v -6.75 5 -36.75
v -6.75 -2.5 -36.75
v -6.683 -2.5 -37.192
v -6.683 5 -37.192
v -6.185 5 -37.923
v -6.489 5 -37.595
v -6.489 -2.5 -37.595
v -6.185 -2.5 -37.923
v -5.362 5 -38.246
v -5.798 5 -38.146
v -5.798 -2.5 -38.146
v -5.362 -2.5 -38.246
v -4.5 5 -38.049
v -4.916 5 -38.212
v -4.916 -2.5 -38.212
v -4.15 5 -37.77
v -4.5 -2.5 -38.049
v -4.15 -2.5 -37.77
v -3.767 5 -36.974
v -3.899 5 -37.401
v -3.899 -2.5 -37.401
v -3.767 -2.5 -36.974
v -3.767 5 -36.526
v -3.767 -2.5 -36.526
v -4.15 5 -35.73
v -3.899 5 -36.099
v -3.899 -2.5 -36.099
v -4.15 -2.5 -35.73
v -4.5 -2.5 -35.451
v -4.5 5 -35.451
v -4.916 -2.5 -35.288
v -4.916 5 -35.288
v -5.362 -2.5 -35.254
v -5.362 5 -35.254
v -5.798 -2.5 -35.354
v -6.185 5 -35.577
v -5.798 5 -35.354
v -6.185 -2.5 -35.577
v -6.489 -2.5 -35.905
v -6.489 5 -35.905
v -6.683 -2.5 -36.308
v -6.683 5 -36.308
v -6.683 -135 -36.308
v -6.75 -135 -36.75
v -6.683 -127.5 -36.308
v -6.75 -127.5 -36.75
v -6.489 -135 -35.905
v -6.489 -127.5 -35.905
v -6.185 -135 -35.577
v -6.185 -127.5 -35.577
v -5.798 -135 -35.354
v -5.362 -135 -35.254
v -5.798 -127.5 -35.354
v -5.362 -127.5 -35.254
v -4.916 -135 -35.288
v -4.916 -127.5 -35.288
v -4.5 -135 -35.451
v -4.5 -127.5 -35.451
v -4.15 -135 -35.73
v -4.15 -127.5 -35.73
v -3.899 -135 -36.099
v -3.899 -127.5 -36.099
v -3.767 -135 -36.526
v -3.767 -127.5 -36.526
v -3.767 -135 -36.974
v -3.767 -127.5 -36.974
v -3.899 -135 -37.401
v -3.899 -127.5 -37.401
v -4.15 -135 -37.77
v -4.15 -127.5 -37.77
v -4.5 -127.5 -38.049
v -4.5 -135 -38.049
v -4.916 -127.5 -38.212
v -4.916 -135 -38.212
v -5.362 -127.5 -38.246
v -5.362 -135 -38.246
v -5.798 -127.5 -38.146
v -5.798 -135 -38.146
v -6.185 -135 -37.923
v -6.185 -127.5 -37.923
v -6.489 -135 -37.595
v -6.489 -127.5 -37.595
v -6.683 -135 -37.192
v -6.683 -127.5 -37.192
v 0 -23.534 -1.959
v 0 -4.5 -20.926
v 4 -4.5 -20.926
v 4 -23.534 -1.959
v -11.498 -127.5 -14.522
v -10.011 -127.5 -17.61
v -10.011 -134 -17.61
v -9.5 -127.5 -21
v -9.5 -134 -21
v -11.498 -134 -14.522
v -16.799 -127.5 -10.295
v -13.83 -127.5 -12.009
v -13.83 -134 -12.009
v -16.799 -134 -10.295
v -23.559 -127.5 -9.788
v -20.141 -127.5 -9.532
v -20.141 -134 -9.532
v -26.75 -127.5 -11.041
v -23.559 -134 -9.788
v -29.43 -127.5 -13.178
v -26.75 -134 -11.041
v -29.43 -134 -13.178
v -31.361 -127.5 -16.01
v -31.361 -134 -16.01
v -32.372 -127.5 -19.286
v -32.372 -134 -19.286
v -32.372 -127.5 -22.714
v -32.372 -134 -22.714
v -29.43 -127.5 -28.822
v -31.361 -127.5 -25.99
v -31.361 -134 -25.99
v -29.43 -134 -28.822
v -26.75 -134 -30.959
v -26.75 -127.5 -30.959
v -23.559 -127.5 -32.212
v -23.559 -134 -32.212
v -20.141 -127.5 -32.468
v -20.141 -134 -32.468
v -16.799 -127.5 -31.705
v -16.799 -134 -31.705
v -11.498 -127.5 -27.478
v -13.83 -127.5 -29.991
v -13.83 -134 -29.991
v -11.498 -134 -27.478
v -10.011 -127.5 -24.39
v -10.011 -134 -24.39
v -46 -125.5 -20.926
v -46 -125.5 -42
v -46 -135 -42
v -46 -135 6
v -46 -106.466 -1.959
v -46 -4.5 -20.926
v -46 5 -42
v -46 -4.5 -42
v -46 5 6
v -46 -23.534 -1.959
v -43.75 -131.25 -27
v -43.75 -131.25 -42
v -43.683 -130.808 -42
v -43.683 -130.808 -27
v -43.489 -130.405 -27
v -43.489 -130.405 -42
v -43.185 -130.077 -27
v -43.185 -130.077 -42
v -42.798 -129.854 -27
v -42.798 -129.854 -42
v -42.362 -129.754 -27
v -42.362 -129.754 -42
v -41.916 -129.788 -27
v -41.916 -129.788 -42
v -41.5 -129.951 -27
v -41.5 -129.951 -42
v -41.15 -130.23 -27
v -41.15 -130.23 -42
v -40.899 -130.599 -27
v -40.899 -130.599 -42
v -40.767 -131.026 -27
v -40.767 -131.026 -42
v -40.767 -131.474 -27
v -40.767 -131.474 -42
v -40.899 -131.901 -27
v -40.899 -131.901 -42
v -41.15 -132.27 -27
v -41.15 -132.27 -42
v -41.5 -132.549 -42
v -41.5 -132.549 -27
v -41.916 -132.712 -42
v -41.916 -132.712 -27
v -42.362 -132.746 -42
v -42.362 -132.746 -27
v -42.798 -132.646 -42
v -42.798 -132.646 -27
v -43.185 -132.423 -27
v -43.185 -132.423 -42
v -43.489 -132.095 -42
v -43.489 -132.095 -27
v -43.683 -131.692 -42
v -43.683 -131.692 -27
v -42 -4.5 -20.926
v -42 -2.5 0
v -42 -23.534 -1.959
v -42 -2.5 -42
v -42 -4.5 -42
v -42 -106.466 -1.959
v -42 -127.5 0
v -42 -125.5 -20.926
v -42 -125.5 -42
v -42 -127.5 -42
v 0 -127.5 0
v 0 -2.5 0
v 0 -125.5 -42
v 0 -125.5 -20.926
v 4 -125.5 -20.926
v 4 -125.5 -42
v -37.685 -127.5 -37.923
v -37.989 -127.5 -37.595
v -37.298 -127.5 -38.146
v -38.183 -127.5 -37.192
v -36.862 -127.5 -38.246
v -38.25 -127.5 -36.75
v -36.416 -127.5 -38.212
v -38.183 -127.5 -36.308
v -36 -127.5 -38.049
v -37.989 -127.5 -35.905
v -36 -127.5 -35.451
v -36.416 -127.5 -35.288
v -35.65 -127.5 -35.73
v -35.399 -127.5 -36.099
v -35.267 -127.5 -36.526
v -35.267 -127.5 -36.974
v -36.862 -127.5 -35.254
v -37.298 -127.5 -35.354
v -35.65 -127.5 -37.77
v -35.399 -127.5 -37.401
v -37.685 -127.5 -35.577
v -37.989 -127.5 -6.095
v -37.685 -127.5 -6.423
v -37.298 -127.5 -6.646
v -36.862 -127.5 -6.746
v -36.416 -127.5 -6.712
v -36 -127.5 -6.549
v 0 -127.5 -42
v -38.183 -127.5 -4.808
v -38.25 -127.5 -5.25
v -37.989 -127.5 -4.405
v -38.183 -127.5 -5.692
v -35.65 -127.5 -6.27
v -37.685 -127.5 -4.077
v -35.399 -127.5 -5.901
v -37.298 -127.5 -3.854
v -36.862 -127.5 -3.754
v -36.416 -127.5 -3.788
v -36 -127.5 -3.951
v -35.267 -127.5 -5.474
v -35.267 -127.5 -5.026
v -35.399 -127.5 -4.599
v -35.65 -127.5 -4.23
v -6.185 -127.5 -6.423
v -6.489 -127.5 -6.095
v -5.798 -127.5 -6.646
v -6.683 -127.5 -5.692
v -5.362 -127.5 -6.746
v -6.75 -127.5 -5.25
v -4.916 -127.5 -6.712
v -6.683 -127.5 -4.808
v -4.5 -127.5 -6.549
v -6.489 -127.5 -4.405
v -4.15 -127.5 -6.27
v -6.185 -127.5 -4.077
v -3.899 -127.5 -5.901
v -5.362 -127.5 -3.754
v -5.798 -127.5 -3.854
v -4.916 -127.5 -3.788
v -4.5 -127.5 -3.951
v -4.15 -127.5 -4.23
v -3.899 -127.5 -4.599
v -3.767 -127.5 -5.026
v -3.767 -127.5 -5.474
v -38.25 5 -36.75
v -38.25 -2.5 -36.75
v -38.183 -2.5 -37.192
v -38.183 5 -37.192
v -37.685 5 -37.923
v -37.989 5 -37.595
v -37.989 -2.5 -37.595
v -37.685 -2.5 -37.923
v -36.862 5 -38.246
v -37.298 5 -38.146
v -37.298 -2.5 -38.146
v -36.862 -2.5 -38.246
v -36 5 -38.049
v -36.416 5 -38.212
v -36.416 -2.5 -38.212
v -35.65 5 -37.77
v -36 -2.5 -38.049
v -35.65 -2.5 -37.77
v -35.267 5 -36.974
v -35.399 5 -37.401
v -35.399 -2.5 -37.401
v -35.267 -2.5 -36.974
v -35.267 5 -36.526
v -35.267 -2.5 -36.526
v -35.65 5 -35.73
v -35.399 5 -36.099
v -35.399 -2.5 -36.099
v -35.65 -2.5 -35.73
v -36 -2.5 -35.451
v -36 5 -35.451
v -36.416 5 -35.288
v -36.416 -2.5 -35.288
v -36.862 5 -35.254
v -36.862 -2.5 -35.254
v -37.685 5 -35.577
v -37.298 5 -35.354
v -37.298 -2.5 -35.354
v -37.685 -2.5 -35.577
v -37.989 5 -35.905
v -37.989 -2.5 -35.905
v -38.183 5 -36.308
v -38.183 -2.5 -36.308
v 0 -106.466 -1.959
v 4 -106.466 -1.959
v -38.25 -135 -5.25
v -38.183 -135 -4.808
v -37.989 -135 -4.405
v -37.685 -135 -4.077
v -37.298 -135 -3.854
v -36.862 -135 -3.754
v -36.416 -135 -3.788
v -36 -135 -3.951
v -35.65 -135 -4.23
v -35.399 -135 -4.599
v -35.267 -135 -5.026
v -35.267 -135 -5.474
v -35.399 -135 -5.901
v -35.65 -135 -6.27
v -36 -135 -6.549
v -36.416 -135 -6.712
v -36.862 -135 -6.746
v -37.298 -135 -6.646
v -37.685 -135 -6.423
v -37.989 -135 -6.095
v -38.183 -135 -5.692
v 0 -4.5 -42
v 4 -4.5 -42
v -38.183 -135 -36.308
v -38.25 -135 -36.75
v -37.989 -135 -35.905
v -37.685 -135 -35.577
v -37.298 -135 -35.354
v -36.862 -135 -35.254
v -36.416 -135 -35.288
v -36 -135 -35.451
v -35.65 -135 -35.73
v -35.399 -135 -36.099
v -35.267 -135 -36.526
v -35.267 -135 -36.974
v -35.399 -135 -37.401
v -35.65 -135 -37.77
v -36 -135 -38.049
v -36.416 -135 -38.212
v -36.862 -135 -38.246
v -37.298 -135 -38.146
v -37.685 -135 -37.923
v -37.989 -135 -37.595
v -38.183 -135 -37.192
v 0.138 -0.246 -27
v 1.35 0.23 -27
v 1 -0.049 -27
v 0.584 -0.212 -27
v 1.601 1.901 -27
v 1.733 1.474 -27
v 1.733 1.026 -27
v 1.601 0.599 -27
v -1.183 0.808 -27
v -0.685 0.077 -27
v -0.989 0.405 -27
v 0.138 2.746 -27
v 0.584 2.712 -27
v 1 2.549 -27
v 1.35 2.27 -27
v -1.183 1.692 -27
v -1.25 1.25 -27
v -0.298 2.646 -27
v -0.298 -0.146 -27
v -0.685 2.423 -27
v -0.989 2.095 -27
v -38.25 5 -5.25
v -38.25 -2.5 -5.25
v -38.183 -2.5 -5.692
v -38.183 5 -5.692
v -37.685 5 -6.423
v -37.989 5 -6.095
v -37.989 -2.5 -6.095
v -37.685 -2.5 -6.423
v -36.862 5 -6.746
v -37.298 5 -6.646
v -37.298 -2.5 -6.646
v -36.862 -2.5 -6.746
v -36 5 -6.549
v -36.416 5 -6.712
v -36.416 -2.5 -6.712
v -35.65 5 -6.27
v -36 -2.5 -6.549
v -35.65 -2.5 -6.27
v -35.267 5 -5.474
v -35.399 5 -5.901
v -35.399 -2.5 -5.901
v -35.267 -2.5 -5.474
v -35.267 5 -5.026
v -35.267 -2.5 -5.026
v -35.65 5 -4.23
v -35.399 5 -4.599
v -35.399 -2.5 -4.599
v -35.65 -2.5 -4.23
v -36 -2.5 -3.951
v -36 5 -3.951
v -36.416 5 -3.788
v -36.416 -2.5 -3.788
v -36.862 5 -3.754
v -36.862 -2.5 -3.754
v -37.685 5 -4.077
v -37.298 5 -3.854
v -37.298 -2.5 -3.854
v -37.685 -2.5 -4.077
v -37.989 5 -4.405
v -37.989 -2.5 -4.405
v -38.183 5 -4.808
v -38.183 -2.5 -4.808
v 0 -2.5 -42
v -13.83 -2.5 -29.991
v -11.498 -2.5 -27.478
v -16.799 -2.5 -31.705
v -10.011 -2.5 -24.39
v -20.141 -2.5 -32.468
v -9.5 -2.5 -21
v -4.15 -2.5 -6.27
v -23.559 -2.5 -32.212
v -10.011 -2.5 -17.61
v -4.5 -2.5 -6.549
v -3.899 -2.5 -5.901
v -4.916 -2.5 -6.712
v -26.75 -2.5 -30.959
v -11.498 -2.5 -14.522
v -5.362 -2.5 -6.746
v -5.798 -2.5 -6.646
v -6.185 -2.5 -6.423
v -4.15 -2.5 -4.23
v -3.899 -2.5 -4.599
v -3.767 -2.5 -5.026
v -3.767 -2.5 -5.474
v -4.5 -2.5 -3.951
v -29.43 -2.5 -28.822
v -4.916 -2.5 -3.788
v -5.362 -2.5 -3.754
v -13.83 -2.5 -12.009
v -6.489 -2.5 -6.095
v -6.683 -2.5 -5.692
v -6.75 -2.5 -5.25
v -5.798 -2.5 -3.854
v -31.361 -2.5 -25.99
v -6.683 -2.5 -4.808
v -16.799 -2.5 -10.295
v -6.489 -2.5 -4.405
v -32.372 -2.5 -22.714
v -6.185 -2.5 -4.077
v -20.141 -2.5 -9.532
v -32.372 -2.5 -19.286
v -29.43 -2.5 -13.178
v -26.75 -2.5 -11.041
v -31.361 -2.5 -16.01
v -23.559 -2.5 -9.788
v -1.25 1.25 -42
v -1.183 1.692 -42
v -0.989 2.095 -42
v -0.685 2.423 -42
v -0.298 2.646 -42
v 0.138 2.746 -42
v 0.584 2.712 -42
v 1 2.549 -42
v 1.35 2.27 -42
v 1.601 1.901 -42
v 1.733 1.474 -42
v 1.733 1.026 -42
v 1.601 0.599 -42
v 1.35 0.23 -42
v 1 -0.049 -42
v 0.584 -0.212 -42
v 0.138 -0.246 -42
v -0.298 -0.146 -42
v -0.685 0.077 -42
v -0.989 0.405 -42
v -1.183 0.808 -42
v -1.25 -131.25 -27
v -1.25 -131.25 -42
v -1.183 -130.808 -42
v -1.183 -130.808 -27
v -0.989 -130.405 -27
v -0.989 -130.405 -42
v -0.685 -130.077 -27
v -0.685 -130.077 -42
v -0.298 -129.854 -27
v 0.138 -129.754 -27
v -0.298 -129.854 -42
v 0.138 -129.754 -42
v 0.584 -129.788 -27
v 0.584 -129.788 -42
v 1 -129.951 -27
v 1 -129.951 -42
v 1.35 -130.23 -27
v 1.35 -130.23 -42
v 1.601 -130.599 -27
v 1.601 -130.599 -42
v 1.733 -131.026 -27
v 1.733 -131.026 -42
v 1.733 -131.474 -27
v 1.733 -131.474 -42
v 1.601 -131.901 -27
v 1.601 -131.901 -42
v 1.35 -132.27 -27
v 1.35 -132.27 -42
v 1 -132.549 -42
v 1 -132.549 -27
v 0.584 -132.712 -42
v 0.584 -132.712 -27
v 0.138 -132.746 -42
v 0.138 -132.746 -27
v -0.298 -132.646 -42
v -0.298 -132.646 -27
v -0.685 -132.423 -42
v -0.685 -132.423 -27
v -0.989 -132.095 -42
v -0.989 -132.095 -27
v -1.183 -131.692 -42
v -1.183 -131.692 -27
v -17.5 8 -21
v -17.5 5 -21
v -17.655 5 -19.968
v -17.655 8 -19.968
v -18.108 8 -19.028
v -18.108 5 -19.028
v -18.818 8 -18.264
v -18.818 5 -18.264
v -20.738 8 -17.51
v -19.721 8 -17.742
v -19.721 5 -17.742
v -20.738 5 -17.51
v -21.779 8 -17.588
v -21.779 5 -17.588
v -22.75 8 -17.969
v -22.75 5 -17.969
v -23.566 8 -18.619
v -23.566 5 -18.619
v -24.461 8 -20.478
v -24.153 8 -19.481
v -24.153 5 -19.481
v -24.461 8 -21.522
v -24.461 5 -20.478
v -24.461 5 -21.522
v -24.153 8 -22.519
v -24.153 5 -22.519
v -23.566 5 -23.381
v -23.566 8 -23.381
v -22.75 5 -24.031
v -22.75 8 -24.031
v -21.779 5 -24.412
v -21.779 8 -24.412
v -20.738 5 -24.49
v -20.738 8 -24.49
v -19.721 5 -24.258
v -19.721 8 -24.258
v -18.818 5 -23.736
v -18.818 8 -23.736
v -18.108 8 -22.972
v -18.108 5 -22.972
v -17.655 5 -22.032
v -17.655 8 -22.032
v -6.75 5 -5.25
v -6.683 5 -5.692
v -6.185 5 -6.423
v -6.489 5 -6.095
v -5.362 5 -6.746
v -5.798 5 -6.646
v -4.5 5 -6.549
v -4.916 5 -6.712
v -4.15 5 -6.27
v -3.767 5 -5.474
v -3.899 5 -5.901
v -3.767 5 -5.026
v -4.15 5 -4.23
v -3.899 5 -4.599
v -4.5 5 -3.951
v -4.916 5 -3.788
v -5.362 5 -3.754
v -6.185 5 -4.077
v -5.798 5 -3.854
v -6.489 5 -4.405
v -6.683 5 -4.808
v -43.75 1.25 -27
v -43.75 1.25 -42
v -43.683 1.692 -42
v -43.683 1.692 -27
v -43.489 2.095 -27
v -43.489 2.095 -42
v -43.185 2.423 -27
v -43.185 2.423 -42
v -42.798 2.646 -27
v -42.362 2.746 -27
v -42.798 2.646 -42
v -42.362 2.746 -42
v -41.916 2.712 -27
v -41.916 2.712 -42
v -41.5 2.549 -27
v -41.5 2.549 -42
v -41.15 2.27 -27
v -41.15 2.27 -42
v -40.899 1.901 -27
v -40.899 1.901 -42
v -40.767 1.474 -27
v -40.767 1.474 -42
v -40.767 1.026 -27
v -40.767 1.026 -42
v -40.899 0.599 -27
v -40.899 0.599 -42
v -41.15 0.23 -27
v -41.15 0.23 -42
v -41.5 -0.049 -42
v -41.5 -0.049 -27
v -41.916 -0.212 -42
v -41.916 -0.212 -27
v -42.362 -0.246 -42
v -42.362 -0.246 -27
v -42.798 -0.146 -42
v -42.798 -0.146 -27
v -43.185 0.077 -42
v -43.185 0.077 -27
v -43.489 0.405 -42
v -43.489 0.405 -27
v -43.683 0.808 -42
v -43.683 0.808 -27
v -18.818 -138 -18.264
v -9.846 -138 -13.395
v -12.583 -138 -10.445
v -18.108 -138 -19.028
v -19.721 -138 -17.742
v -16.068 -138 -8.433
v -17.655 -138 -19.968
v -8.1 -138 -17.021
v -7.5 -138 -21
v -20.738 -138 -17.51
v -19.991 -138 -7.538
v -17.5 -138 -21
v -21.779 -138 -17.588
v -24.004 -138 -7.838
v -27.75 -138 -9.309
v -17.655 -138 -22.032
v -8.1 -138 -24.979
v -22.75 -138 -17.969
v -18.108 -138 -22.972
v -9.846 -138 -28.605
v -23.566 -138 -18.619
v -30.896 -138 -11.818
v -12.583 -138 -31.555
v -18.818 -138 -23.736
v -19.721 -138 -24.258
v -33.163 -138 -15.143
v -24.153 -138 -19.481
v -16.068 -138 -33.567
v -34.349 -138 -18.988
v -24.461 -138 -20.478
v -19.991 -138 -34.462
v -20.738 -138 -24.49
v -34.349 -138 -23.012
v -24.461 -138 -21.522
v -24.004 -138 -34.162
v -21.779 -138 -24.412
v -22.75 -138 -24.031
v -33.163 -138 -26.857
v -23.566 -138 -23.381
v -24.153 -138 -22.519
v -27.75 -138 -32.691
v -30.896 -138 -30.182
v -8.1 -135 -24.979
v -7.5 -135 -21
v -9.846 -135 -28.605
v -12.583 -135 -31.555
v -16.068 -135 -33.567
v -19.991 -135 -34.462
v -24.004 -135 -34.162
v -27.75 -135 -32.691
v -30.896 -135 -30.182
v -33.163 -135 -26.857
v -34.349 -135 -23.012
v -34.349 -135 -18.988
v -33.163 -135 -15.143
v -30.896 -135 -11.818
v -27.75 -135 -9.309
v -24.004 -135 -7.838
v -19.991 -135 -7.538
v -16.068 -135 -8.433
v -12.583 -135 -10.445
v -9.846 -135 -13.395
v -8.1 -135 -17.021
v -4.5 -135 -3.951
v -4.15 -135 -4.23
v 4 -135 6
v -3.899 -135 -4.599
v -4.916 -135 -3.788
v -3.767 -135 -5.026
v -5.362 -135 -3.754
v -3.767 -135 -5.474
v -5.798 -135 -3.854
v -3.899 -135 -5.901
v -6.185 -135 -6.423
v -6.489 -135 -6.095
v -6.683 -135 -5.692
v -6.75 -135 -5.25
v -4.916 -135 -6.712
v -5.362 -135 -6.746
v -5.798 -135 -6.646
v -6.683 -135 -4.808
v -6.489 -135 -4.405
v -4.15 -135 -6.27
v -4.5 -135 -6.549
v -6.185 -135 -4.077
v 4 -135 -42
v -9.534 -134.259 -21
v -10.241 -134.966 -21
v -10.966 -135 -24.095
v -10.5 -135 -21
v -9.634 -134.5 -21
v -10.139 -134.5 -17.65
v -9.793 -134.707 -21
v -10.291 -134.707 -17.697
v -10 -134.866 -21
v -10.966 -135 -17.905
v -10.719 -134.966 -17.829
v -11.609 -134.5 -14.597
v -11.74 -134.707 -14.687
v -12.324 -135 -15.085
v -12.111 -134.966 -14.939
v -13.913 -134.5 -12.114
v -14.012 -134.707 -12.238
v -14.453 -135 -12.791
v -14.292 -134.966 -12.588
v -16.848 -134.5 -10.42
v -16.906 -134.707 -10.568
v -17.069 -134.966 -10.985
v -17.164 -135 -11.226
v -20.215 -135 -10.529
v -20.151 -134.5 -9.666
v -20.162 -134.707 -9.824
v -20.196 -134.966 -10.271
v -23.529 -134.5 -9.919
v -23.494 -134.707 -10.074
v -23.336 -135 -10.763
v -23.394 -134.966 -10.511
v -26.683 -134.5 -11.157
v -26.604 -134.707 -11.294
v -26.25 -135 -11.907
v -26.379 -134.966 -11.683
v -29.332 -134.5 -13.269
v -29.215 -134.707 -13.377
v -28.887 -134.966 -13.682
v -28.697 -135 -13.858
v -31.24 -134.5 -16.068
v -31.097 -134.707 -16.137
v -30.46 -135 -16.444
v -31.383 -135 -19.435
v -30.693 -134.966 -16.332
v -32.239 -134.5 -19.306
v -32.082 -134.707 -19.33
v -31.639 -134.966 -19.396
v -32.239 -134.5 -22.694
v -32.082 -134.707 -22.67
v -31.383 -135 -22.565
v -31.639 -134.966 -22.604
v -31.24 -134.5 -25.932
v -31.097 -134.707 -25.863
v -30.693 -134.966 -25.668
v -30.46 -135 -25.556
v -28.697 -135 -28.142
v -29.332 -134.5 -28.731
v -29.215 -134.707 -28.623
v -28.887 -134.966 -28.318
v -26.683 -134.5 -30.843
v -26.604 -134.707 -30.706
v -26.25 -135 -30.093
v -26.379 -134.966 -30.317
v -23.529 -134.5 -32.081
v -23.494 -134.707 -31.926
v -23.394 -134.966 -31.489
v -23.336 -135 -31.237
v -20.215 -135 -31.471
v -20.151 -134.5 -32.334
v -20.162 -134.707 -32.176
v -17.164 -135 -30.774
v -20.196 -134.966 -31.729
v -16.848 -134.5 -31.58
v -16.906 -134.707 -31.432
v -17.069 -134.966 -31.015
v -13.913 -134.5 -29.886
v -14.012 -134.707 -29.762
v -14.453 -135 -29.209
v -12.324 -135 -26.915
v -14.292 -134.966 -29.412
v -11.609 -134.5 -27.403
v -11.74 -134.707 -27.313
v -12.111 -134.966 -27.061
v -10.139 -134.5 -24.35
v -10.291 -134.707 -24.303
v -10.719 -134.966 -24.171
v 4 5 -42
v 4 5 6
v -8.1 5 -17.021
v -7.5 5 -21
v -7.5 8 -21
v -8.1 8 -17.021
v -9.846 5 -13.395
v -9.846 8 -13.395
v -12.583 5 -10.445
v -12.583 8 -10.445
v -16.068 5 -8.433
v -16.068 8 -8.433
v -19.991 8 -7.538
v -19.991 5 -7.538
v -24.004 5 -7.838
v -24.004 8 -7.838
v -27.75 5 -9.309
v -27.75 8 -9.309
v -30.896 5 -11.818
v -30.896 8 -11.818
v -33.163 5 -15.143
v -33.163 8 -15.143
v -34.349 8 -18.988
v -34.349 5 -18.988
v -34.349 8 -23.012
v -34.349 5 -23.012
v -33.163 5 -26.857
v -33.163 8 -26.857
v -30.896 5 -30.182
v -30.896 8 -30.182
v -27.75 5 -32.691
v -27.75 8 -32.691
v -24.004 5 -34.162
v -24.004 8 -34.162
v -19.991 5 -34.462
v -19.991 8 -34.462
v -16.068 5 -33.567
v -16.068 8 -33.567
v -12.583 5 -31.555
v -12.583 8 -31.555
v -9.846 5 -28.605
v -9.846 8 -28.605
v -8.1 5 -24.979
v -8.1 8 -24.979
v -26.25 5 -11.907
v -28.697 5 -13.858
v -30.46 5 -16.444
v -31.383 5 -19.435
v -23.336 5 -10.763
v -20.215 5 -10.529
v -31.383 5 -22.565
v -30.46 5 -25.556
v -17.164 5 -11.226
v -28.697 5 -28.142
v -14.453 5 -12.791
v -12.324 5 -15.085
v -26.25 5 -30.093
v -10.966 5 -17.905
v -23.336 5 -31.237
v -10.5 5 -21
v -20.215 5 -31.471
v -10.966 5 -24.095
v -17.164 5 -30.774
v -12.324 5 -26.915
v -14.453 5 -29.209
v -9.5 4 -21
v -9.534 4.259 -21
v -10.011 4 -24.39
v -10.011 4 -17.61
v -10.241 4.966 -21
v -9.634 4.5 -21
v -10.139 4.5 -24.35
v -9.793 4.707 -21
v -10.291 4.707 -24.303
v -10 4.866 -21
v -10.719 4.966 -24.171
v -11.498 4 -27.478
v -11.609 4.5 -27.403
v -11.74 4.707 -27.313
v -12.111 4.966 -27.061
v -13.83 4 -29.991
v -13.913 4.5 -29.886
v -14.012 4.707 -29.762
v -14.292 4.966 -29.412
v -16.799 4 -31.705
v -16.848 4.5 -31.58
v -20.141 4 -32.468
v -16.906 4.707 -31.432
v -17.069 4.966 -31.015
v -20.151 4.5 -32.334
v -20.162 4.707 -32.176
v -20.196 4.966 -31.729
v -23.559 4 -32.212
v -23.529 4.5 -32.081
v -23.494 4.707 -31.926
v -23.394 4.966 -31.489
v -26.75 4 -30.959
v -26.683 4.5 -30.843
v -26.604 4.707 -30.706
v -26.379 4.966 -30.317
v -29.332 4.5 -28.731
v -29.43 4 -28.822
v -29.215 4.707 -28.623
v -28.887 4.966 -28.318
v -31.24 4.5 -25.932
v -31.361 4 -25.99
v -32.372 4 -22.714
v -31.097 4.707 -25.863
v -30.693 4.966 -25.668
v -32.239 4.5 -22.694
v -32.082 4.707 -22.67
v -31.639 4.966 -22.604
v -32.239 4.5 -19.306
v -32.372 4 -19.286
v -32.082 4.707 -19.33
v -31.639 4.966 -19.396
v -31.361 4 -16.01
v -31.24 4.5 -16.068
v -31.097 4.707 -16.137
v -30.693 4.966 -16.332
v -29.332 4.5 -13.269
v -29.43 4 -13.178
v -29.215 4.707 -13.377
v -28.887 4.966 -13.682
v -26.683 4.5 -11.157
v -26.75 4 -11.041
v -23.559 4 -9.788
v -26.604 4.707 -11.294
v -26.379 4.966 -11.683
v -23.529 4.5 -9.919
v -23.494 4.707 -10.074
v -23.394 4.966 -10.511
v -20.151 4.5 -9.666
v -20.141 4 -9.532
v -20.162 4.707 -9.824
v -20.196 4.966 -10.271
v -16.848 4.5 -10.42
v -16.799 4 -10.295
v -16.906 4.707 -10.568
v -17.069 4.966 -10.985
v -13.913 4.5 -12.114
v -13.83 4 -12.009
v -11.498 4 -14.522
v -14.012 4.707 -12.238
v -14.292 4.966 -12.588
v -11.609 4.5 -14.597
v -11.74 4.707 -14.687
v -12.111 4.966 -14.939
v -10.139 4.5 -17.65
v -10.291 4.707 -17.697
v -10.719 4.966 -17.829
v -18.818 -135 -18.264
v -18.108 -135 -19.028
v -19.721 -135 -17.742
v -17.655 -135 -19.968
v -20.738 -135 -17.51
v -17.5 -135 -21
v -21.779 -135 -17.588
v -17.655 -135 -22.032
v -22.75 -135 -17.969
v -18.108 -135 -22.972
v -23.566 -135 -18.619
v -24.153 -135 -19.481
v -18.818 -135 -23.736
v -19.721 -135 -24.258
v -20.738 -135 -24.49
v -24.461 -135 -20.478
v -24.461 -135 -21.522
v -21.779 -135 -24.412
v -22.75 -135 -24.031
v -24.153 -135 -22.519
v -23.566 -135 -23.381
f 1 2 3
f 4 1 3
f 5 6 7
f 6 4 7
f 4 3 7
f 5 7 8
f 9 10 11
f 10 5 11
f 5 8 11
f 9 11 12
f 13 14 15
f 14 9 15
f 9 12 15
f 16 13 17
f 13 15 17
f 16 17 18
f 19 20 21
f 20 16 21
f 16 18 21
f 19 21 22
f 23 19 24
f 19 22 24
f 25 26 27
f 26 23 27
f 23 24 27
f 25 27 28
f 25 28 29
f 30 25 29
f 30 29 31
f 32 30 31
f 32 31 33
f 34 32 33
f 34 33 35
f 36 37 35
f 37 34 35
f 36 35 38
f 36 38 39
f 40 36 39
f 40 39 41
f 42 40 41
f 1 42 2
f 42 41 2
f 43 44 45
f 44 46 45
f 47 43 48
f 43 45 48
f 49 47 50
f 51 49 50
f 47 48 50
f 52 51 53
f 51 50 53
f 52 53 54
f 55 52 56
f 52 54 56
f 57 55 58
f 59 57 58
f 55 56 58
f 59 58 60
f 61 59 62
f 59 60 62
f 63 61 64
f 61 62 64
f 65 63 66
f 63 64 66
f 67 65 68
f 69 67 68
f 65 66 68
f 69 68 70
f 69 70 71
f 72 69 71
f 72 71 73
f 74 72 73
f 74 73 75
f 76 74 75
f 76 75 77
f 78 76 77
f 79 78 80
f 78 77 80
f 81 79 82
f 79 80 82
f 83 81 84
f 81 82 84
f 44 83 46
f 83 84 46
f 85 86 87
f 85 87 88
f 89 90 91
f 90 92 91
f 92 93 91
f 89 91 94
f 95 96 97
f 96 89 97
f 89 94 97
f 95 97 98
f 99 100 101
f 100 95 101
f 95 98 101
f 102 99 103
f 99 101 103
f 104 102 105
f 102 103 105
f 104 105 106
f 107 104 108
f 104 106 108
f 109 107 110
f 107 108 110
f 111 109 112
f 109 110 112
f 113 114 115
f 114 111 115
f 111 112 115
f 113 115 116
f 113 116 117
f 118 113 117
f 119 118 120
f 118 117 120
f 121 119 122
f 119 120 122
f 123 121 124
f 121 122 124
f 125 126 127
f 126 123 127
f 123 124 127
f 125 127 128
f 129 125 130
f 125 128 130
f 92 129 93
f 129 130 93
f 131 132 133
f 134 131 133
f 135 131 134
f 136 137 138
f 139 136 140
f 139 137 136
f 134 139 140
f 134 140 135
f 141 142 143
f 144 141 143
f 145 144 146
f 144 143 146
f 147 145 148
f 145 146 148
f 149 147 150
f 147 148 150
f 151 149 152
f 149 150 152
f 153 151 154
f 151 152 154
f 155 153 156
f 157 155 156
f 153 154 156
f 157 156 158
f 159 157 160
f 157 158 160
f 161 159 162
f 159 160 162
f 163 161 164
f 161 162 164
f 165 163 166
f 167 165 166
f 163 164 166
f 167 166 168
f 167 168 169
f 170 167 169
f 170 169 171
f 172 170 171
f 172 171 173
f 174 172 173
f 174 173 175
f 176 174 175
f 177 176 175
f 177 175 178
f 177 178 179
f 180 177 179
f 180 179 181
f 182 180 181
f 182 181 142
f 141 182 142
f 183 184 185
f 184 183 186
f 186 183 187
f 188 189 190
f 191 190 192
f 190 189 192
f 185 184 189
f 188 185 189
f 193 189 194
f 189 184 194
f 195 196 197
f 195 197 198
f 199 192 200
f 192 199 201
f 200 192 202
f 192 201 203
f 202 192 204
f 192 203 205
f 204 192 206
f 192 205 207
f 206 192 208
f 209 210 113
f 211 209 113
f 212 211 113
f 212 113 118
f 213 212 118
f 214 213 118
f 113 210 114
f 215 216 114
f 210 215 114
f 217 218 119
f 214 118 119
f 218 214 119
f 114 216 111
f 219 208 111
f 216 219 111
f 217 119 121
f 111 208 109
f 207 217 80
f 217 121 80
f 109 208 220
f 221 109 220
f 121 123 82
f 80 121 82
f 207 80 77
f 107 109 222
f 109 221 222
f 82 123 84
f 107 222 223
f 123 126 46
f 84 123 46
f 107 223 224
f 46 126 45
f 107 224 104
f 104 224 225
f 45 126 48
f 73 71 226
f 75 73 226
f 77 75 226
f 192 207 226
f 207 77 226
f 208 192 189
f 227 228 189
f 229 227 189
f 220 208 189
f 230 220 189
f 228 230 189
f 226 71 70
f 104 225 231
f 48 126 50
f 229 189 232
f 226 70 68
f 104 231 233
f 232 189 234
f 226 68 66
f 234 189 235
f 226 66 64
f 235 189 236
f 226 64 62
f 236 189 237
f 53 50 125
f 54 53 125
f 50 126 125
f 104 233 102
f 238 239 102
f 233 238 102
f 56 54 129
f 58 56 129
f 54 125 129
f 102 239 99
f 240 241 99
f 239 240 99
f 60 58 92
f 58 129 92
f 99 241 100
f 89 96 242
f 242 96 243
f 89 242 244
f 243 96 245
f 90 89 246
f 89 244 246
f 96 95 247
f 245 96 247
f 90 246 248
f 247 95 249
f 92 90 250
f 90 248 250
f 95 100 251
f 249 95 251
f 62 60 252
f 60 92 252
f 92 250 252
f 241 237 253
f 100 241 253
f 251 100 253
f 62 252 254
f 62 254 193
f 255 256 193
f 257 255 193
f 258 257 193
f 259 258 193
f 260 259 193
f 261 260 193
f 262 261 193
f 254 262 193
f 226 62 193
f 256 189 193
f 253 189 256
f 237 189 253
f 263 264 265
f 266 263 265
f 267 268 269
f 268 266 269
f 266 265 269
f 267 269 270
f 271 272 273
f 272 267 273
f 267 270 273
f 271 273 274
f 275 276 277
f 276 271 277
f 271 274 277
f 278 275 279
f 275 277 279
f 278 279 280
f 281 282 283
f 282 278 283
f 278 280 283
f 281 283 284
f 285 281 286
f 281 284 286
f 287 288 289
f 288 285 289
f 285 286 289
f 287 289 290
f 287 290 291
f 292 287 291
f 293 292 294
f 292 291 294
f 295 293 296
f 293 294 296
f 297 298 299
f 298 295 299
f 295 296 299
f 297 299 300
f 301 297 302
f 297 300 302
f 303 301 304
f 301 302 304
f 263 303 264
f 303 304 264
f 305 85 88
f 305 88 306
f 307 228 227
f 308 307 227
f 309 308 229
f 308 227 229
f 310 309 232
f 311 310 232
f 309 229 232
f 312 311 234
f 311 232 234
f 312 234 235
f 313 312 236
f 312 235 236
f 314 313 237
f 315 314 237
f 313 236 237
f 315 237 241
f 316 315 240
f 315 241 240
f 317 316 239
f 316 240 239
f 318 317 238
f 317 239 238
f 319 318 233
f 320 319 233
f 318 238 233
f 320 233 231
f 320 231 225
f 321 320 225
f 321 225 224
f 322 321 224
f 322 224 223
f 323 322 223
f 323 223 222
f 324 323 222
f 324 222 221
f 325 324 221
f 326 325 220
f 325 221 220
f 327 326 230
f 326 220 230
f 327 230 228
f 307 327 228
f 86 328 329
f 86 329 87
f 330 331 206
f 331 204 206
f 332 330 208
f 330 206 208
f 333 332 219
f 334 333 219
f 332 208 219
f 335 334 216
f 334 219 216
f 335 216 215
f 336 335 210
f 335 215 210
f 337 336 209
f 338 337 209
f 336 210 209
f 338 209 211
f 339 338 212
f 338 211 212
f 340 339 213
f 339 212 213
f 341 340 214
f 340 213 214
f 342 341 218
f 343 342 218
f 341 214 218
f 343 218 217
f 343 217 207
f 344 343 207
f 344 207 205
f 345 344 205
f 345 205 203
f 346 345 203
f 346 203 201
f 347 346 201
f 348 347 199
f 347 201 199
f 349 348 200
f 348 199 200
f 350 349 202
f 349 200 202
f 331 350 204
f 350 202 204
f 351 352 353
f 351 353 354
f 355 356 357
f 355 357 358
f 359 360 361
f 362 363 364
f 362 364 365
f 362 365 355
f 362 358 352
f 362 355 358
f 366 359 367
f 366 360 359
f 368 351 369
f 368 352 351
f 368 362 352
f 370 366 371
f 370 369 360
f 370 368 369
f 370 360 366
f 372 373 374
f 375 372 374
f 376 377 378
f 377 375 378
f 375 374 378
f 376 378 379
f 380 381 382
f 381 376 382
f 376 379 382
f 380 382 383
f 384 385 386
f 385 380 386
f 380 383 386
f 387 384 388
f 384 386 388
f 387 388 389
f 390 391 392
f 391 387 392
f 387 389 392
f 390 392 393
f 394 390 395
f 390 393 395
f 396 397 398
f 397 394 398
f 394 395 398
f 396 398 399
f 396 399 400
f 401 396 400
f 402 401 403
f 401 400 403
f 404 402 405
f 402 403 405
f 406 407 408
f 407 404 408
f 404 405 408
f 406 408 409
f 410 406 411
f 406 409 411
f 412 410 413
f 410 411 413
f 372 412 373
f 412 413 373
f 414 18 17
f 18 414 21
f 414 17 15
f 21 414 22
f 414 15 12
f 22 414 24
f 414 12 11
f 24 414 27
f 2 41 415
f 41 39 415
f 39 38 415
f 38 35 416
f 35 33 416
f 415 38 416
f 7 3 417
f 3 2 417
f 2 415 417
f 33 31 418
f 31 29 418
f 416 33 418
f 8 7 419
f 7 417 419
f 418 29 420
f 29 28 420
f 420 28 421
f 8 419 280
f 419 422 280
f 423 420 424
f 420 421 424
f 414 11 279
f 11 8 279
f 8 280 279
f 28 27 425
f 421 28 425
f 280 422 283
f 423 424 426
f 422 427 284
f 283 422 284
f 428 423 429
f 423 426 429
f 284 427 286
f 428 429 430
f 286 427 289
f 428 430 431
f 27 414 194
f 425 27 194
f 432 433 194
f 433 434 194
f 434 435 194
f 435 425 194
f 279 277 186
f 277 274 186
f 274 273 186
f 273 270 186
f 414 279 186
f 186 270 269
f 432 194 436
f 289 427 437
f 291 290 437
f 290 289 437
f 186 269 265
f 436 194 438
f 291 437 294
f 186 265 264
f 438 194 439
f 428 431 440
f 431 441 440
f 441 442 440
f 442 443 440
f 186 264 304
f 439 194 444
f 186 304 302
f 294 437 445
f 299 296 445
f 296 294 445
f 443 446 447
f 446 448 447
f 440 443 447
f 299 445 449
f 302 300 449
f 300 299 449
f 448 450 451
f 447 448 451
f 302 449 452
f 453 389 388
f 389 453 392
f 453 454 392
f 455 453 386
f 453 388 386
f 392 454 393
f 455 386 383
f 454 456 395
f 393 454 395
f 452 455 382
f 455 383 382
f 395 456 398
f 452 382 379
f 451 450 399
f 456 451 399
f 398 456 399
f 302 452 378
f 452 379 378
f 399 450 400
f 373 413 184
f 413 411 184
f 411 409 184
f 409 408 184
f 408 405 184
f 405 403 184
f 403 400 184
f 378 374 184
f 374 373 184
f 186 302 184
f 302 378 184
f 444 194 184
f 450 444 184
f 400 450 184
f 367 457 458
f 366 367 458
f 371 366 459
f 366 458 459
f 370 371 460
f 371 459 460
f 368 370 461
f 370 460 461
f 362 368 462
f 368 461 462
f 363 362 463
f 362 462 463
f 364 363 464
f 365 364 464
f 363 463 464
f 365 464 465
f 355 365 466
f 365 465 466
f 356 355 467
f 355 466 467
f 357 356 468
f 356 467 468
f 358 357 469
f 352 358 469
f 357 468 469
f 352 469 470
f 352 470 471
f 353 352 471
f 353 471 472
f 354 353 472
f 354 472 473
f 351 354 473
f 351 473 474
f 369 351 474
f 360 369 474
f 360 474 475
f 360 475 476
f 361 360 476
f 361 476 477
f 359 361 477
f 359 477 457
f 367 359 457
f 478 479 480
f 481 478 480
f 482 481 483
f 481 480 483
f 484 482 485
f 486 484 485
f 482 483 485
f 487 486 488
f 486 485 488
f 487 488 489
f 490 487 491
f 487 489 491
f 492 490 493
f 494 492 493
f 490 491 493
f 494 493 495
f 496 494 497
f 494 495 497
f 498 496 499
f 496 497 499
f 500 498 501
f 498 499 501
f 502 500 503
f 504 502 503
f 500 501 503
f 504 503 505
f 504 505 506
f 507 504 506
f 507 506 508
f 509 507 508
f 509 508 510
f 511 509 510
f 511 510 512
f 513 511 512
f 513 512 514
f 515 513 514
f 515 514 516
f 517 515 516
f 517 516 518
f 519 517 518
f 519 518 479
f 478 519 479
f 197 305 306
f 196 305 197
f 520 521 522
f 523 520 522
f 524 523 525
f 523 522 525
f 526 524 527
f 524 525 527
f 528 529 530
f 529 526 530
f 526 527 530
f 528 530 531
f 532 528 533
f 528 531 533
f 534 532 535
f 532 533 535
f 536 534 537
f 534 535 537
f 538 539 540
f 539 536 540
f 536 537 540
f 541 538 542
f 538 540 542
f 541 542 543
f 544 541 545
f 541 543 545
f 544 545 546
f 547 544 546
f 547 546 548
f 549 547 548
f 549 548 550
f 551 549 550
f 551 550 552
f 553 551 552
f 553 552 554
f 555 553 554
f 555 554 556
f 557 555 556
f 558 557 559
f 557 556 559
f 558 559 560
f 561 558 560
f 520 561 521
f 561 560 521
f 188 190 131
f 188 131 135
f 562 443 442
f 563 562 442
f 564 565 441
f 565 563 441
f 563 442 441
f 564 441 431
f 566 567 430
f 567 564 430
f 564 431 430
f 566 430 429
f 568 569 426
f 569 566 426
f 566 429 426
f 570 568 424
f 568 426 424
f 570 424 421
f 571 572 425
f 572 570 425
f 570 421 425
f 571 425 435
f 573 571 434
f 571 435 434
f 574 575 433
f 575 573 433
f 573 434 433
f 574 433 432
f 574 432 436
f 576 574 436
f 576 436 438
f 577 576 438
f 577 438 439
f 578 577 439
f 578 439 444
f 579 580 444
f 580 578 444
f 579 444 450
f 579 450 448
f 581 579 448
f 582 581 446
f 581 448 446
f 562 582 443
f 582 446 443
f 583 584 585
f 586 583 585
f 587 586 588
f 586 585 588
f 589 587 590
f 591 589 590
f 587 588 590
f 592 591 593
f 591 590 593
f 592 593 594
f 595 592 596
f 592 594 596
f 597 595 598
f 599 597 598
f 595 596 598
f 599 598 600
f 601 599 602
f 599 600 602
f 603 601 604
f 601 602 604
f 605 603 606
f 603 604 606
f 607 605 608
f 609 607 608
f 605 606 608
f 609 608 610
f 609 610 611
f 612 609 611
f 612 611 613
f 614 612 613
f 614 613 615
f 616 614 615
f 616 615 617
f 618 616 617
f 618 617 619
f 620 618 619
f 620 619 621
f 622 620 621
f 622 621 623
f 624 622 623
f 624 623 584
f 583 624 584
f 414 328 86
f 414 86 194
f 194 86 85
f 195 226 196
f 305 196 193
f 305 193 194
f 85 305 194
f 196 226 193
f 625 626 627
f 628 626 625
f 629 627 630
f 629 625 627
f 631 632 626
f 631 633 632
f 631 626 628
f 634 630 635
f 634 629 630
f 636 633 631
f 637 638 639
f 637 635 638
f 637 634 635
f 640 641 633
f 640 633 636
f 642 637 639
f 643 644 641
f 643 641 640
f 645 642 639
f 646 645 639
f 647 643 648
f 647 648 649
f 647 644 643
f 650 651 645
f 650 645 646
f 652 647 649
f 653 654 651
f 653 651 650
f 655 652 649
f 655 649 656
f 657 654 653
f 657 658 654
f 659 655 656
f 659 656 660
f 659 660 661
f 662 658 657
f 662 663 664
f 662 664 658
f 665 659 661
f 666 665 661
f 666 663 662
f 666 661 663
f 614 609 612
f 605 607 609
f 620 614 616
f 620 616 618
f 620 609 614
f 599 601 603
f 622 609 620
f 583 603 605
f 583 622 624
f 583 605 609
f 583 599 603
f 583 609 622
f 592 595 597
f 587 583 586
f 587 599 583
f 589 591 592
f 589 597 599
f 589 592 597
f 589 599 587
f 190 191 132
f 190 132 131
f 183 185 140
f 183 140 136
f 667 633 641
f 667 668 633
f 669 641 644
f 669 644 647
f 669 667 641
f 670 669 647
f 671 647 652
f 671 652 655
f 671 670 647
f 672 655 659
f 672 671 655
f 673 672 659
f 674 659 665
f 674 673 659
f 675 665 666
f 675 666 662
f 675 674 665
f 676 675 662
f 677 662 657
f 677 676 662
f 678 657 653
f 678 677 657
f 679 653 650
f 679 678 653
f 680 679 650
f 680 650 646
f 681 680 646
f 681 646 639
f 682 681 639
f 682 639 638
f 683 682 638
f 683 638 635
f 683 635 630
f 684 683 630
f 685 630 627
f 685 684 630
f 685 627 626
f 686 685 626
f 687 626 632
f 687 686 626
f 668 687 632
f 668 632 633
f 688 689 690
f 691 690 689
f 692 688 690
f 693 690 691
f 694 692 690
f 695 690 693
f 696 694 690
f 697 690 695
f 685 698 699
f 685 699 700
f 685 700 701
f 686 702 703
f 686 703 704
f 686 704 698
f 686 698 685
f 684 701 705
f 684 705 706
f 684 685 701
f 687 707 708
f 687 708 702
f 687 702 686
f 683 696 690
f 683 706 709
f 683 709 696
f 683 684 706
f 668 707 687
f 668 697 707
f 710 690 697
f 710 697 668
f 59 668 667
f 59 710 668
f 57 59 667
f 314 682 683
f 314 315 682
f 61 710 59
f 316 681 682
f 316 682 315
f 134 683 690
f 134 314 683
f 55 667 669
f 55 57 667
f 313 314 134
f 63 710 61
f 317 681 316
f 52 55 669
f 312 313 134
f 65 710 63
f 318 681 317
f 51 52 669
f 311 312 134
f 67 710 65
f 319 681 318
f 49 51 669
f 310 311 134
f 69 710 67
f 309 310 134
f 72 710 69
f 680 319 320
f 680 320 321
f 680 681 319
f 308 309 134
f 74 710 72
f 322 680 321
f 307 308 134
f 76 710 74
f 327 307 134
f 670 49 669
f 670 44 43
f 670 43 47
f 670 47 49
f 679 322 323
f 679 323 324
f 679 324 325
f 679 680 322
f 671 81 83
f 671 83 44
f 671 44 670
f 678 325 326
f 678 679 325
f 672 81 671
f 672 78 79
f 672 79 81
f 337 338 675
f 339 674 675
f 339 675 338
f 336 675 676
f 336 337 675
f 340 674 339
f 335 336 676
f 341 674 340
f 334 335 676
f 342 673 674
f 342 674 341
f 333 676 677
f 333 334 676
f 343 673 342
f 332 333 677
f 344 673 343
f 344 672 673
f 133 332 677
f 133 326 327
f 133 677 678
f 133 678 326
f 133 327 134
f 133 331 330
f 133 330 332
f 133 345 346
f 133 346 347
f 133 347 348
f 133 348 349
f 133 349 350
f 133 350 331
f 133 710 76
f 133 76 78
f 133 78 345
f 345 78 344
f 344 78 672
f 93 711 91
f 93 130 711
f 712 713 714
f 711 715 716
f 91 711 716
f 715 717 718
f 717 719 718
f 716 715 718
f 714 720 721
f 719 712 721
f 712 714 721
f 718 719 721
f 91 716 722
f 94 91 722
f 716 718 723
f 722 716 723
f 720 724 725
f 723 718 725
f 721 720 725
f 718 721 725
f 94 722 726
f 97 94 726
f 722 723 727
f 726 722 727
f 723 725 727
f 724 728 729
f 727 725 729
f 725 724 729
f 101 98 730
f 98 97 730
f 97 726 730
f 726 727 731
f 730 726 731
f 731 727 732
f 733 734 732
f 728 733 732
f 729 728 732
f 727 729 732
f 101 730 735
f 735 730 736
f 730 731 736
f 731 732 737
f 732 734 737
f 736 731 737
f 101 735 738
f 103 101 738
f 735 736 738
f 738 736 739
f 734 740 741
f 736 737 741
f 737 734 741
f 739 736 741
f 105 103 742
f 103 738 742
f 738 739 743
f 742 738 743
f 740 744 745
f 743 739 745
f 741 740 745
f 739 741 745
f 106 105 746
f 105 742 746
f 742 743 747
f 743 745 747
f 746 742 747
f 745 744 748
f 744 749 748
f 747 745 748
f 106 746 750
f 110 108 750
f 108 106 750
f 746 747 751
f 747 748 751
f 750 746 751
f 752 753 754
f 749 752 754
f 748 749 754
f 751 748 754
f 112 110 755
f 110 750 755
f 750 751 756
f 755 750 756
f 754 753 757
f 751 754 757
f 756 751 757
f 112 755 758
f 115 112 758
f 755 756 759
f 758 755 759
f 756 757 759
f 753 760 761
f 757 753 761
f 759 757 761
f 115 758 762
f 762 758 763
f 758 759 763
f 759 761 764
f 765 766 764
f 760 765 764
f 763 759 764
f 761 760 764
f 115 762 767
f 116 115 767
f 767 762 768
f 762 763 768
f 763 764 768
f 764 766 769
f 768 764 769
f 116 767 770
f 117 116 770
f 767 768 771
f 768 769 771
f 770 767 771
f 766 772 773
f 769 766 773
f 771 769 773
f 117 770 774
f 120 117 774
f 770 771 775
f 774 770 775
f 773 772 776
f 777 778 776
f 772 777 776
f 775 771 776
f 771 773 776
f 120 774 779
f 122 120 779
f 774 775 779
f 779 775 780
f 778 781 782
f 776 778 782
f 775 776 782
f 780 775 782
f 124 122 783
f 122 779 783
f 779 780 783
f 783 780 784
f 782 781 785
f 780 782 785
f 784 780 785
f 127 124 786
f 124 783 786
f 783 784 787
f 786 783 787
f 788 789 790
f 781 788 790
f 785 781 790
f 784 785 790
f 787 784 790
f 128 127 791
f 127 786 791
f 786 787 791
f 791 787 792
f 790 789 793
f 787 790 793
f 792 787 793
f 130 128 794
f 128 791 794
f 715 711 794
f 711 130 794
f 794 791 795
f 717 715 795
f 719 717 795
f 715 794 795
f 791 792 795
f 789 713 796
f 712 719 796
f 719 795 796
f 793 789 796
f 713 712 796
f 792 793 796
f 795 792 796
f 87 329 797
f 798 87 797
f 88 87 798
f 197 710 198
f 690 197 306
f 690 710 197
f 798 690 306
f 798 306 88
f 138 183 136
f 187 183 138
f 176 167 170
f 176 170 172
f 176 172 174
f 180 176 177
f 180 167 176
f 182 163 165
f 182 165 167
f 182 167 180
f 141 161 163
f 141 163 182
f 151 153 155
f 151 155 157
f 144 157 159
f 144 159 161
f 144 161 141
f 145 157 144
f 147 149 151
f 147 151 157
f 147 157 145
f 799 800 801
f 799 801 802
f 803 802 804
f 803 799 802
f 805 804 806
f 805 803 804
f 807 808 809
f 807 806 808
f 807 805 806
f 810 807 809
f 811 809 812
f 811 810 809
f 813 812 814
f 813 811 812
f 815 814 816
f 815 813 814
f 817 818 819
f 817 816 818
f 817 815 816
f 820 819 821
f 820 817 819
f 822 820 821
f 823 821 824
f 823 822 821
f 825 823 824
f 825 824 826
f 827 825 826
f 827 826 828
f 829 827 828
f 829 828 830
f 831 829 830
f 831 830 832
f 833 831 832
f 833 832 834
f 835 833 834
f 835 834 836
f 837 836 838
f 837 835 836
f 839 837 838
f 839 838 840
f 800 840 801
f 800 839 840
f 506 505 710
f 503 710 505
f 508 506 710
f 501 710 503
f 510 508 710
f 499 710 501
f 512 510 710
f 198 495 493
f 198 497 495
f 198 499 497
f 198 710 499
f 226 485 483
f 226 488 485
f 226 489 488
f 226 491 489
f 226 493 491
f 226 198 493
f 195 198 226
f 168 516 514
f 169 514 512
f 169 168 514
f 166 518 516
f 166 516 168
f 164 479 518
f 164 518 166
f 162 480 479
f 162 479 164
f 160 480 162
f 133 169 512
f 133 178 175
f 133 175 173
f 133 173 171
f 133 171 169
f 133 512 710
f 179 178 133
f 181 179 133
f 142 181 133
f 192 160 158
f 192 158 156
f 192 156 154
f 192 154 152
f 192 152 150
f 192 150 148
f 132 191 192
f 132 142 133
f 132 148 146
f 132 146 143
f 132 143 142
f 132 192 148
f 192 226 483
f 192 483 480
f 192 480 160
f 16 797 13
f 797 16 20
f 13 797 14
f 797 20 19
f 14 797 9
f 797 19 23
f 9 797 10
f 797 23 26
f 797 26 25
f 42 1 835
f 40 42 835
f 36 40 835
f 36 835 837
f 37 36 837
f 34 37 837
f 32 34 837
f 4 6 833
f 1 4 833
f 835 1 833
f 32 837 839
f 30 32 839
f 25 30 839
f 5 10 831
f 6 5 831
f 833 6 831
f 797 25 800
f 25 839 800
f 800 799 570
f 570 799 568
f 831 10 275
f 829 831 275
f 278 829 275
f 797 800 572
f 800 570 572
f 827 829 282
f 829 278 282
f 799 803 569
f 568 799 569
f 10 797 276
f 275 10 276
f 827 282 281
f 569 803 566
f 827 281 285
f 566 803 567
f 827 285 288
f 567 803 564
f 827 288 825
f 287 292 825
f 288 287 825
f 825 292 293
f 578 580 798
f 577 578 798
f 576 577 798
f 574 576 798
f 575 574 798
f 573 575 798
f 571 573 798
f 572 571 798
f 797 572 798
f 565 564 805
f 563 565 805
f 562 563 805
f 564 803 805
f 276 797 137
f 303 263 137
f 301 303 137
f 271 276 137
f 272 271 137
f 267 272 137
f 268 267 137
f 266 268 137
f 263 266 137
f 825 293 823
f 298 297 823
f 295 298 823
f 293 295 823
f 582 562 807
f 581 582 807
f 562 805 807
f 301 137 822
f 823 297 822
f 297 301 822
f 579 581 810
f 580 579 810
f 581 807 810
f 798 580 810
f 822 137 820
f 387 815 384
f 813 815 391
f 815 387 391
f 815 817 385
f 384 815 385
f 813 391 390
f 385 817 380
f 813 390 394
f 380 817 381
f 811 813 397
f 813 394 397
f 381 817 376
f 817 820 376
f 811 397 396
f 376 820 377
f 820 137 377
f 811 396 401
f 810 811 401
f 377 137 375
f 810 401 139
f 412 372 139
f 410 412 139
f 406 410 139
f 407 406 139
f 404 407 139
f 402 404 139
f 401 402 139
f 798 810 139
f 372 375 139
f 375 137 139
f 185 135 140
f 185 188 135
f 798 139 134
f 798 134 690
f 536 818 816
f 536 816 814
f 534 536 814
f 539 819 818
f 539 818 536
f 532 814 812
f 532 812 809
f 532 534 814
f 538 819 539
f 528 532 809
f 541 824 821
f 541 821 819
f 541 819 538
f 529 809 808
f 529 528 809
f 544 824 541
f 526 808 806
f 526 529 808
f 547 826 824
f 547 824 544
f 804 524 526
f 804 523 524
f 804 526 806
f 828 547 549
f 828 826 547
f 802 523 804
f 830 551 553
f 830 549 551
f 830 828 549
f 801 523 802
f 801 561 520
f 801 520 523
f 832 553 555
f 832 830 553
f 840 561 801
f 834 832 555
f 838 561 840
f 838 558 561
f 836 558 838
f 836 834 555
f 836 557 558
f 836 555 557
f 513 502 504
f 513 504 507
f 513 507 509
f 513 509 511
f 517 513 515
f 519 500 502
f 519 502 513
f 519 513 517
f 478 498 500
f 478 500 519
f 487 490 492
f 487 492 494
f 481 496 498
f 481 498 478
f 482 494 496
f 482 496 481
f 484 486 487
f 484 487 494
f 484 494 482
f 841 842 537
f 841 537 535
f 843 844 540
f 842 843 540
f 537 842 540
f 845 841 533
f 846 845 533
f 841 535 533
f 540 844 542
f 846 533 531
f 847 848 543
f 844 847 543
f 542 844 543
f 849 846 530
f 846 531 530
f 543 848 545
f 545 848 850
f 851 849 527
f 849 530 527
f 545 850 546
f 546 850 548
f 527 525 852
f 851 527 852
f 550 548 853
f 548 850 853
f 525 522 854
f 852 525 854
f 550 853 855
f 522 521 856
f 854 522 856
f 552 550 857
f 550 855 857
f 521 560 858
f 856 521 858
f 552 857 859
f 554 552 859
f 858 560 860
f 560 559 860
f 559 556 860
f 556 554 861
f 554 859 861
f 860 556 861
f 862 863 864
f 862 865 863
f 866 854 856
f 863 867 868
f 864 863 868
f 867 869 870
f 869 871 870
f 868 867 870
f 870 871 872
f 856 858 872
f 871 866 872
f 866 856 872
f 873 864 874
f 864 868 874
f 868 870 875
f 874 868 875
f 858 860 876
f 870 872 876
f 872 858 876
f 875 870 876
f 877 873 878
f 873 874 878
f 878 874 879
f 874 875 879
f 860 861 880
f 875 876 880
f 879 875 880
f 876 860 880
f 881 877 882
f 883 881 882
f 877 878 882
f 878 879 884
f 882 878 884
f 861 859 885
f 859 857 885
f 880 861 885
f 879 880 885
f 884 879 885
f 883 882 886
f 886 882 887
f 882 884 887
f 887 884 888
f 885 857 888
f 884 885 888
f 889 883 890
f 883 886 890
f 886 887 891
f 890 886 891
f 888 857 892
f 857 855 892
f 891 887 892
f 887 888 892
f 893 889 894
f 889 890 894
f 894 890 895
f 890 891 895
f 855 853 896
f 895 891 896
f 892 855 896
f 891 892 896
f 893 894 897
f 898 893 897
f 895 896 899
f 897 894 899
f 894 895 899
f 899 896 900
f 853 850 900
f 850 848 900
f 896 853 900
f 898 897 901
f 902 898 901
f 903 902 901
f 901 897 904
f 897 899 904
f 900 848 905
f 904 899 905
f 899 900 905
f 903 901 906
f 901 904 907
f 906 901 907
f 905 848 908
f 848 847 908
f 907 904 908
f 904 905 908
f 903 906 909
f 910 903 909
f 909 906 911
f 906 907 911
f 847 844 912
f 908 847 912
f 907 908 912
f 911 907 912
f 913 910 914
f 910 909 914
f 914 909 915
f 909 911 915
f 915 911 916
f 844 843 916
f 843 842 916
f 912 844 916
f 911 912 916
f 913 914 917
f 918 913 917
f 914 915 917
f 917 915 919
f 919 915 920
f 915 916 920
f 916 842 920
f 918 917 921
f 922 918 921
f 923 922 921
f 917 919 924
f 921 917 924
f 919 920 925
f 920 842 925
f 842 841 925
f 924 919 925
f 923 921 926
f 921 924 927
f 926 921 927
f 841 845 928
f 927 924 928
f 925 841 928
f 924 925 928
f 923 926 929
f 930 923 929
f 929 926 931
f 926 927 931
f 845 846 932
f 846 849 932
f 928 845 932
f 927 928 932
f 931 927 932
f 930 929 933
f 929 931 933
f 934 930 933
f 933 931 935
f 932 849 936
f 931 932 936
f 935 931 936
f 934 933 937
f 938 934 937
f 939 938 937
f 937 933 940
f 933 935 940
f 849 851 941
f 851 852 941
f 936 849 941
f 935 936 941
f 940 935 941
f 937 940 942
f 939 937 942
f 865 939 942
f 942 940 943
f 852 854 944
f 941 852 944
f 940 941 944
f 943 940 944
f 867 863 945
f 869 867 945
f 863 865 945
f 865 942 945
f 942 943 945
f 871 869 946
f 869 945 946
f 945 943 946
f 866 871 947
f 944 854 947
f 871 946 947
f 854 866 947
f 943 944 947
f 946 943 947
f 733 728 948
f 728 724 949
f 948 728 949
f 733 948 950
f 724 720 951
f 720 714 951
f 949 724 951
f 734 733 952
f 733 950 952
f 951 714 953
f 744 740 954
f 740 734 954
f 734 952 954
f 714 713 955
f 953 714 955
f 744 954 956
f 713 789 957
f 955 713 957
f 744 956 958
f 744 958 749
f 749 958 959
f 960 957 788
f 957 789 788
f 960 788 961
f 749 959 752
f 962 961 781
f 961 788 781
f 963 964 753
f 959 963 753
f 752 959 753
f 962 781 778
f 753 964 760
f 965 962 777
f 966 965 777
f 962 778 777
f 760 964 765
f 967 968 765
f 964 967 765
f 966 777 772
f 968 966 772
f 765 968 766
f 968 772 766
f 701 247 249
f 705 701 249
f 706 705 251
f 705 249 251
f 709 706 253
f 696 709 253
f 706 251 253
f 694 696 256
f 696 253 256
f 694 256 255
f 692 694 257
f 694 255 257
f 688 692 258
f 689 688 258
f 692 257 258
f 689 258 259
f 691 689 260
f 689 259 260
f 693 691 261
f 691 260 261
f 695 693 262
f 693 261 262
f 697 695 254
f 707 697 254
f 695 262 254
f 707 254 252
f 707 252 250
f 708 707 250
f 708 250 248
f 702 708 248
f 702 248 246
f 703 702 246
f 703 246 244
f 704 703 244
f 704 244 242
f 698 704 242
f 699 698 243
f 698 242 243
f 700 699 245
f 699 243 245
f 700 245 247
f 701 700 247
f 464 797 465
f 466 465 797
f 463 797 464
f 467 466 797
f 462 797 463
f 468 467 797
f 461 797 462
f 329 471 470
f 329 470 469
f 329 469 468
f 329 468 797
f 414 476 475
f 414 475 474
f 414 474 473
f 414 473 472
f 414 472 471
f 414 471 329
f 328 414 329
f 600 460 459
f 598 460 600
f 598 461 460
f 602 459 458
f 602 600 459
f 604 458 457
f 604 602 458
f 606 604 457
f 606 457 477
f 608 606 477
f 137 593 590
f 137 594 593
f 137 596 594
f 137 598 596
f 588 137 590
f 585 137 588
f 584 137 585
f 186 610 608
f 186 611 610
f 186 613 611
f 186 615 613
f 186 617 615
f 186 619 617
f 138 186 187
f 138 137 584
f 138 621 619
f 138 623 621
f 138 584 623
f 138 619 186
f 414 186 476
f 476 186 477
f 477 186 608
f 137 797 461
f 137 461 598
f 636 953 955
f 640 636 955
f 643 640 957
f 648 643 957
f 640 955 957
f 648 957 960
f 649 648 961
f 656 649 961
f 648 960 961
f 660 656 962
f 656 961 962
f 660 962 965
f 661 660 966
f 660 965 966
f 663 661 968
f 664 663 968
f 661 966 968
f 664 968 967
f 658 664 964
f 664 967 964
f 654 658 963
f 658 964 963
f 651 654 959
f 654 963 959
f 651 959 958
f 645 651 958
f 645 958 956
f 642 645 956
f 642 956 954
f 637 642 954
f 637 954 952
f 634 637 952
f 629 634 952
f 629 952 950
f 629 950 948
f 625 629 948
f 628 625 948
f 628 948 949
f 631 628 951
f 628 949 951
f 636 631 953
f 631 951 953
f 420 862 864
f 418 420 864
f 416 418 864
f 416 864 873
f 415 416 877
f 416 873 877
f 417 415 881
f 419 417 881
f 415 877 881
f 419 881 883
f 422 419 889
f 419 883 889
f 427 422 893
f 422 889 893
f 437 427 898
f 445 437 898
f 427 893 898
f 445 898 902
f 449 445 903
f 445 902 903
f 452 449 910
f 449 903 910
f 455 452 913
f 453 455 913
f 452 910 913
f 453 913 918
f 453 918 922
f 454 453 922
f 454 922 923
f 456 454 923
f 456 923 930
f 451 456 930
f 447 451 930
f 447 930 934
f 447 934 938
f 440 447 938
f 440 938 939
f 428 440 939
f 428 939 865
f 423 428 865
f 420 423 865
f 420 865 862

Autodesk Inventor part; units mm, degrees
ref_plane "YZ Plane" through (0, 0, 0) normal (1, 0, 0) x (0, 1, 0)
ref_plane "XY Plane" through (0, 0, 0) normal (0, 0, 1) x (1, 0, 0)
sketch "Sketch1" plane through (0, 0, 0) normal (0, 1, 0) x (-1, 0, 0)
  line L0 (0, 0) -> (42, 0)
  line L1 (42, 0) -> (42, -42)
  line L2 (42, -42) -> (0, -42)
  line L3 (0, -42) -> (0, 0)
  line L4 (0, 0) -> (42, 0)
  line L5 (42, 0) -> (42, -42)
  line L6 (42, -42) -> (0, -42)
  line L7 (0, -42) -> (0, 0)
  line L8 (42, -21) -> (42, -5.25)
  circle A0 centre (36.75, -5.25) radius 1.5
  circle A1 centre (36.75, -36.75) radius 1.5
  circle A2 centre (5.25, -36.75) radius 1.5
  circle A3 centre (5.25, -5.25) radius 1.5
  dimension "d0" = 42
  dimension "d1" = 42
  dimension "d2" = 3
  dimension "d3" = 3
  dimension "d4" = 3
  dimension "d5" = 3
extrude "Extrusion1" add sketch "Sketch1" along normal blind 5 and the other way blind 2.5
sketch "Sketch2" plane through (0, 5, 0) normal (0, 1, 0) x (1, 0, 0)
  circle A0 centre (-21, 21) radius 11.5
  point P0 (0, 0)
  point P1 (-42, 0)
  dimension "d9" = 23
extrude "Extrusion2" cut sketch "Sketch2" against normal up to surface (7.5 mm away)
sketch "Sketch3" plane through (0, 5, 0) normal (0, 1, 0) x (1, 0, 0)
  circle A0 centre (-21, 21) radius 11.5
  circle A1 centre (-21, 21) radius 13.5
  circle A2 centre (-21, 21) radius 3.5
  point P0 (0, 0)
  dimension "d12" = 27
  dimension "d13" = 7
extrude "Extrusion3" add sketch "Sketch3" along normal blind 3 contours A0 | A1
sketch "Sketch4" plane through (-42, -2.5, 0) normal (0, 0, 1) x (1, 0, 0)
  line L0 (42, 7.5) -> (42, 2.5)
  line L1 (42, 7.5) -> (0.1256, 7.5)
  line L2 (42, -112.5) -> (42, 7.5)
  line L3 (42, -112.5) -> (42, -122.5)
  line L4 (42, -132.5) -> (42, -122.5)
  line L5 (0, 0) -> (0, 7.5)
  line L6 (42, -132.5) -> (0, -132.5)
  line L7 (0, -132.5) -> (0, 7.5)
  line L8 (0, 7.5) -> (42, 7.5)
  line L9 (42, 7.5) -> (42, -132.5)
  point P0 (0.1256, 7.5)
  dimension "d20" = 10
extrude "Extrusion4" add sketch "Sketch4" along normal blind 6
ref_plane "Work Plane1" through (0, -62.5, 0) normal (0, 1, 0) x (-1, 0, 0)
ref_plane "Work Plane3" through (0, -65, 0) normal (0, 1, 0) x (1, 0, 0)
mirror "Mirror5" about plane through (0, -65, 0) normal (0, 1, 0) of "Extrusion1", "Extrusion3", "Extrusion2"
sketch "Sketch8" plane through (0, -2.5, -42) normal (1, 0, 0) x (0, 0, -1)
  line L0 (0, 7.5) -> (0, 0)
  line L1 (-48, -132.5) -> (-48, 7.5)
  line L2 (0, 7.5) -> (-48, 7.5)
  line L3 (-48, 7.5) -> (-48, -132.5)
  line L4 (-48, -132.5) -> (0, -132.5)
  line L5 (0, -132.5) -> (0, 7.5)
  line L6 (0, 0) -> (-42, 0)
  line L7 (-21.0744, 0) -> (-42, -20.9256)
  line L8 (-42, -125) -> (-42, 2.5)
  line L9 (-21.0744, 0) -> (8.5189, 0) construction
  line L10 (0, 0) -> (-42, 0)
  line L11 (-42, -20.9256) -> (-42, 2.5)
  line L12 (0, 7.5) -> (0, 0)
  line L13 (-21.0744, 0) -> (0, 0)
  line L14 (-42, -20.9256) -> (-42, -132.5)
  line L15 (0, -132.5) -> (-48, -132.5)
  line L16 (0, 0) -> (0, -2)
  line L17 (0, -2) -> (-21.0744, -2)
  line L18 (-21.0744, -2) -> (-21.0744, 0)
  line L19 (-21.0744, -2) -> (-42, -23)
  line L20 (-42, -23) -> (-40, -23)
  line L21 (-40.0407, -21.0337) -> (-40.0407, -130.0337)
  line L22 (-40.0407, -130.0337) -> (-40.0407, -132.5)
  dimension "d64" = 135
  dimension "d67" = 2
extrude "Extrusion8" add sketch "Sketch8" along normal blind 4 contours L0 L6 L8 L14 L4 L1 L2 | L5 L17 L18 L6 | L7 L8 L6 | L18 L19 L8 L7 | L14 L8 L20 L21 L22 L4 | L21 L20 L19
mirror "Mirror6" about plane through (0, -65, 0) normal (0, 1, 0) of "Extrusion8"
ref_plane "Work Plane4" through (-21, -2.5, -42) normal (-1, 0, 0) x (0, 0, 1)
mirror "Mirror7" about plane through (-21, -2.5, -42) normal (-1, 0, 0) of "Extrusion8", "Mirror6"
sketch "Sketch9" plane through (0, -4.5, -42) normal (0, 0, -1) x (-1, 0, 0)
  line L0 (-4, 9.5) -> (-4, -130.5)
  line L1 (-4, 9.5) -> (-0.25, 9.5)
  line L2 (-0.25, 9.5) -> (-0.25, 5.75)
  line L3 (-0.25, 5.75) -> (-4, 5.75)
  line L4 (-4, 5.75) -> (-4, 9.5)
  line L5 (-4, -130.5) -> (46, -130.5)
  line L6 (46, -130.5) -> (42.25, -130.5)
  line L7 (42.25, -130.5) -> (42.25, -126.75)
  line L8 (42.25, -126.75) -> (46, -126.75)
  line L9 (46, -126.75) -> (46, -130.5)
  circle A0 centre (-0.25, 5.75) radius 1.5
  circle A1 centre (42.25, -126.75) radius 1.5
  circle A2 centre (42.25, 5.75) radius 1.5
  circle A3 centre (-0.25, -126.75) radius 1.5
  point P0 (0, 4.5)
  dimension "d71" = 3.75
  dimension "d72" = 3.75
  dimension "d73" = 3.75
  dimension "d74" = 3.75
  dimension "d75" = 3
  dimension "d76" = 3
  dimension "d77" = 3
  dimension "d78" = 3
extrude "Extrusion9" cut sketch "Sketch9" against normal blind 15 contours A0 L2 L3 | L3 L2 A0 | A1 L8 L7 | L7 L8 A1 | A2 | A3
thread "Thread5"
thread "Thread6"
thread "Thread7"
thread "Thread8"
thread "Thread9"
thread "Thread10"
thread "Thread11"
thread "Thread12"
thread "Thread13"
thread "Thread14"
thread "Thread15"
thread "Thread16"
fillet "Fillet1" radius 1 1 edges at (-32.5, 5, -21)
fillet "Fillet2" radius 1 1 edges at (-32.5, -135, -21)
properties part number "stepperMotorLink"
